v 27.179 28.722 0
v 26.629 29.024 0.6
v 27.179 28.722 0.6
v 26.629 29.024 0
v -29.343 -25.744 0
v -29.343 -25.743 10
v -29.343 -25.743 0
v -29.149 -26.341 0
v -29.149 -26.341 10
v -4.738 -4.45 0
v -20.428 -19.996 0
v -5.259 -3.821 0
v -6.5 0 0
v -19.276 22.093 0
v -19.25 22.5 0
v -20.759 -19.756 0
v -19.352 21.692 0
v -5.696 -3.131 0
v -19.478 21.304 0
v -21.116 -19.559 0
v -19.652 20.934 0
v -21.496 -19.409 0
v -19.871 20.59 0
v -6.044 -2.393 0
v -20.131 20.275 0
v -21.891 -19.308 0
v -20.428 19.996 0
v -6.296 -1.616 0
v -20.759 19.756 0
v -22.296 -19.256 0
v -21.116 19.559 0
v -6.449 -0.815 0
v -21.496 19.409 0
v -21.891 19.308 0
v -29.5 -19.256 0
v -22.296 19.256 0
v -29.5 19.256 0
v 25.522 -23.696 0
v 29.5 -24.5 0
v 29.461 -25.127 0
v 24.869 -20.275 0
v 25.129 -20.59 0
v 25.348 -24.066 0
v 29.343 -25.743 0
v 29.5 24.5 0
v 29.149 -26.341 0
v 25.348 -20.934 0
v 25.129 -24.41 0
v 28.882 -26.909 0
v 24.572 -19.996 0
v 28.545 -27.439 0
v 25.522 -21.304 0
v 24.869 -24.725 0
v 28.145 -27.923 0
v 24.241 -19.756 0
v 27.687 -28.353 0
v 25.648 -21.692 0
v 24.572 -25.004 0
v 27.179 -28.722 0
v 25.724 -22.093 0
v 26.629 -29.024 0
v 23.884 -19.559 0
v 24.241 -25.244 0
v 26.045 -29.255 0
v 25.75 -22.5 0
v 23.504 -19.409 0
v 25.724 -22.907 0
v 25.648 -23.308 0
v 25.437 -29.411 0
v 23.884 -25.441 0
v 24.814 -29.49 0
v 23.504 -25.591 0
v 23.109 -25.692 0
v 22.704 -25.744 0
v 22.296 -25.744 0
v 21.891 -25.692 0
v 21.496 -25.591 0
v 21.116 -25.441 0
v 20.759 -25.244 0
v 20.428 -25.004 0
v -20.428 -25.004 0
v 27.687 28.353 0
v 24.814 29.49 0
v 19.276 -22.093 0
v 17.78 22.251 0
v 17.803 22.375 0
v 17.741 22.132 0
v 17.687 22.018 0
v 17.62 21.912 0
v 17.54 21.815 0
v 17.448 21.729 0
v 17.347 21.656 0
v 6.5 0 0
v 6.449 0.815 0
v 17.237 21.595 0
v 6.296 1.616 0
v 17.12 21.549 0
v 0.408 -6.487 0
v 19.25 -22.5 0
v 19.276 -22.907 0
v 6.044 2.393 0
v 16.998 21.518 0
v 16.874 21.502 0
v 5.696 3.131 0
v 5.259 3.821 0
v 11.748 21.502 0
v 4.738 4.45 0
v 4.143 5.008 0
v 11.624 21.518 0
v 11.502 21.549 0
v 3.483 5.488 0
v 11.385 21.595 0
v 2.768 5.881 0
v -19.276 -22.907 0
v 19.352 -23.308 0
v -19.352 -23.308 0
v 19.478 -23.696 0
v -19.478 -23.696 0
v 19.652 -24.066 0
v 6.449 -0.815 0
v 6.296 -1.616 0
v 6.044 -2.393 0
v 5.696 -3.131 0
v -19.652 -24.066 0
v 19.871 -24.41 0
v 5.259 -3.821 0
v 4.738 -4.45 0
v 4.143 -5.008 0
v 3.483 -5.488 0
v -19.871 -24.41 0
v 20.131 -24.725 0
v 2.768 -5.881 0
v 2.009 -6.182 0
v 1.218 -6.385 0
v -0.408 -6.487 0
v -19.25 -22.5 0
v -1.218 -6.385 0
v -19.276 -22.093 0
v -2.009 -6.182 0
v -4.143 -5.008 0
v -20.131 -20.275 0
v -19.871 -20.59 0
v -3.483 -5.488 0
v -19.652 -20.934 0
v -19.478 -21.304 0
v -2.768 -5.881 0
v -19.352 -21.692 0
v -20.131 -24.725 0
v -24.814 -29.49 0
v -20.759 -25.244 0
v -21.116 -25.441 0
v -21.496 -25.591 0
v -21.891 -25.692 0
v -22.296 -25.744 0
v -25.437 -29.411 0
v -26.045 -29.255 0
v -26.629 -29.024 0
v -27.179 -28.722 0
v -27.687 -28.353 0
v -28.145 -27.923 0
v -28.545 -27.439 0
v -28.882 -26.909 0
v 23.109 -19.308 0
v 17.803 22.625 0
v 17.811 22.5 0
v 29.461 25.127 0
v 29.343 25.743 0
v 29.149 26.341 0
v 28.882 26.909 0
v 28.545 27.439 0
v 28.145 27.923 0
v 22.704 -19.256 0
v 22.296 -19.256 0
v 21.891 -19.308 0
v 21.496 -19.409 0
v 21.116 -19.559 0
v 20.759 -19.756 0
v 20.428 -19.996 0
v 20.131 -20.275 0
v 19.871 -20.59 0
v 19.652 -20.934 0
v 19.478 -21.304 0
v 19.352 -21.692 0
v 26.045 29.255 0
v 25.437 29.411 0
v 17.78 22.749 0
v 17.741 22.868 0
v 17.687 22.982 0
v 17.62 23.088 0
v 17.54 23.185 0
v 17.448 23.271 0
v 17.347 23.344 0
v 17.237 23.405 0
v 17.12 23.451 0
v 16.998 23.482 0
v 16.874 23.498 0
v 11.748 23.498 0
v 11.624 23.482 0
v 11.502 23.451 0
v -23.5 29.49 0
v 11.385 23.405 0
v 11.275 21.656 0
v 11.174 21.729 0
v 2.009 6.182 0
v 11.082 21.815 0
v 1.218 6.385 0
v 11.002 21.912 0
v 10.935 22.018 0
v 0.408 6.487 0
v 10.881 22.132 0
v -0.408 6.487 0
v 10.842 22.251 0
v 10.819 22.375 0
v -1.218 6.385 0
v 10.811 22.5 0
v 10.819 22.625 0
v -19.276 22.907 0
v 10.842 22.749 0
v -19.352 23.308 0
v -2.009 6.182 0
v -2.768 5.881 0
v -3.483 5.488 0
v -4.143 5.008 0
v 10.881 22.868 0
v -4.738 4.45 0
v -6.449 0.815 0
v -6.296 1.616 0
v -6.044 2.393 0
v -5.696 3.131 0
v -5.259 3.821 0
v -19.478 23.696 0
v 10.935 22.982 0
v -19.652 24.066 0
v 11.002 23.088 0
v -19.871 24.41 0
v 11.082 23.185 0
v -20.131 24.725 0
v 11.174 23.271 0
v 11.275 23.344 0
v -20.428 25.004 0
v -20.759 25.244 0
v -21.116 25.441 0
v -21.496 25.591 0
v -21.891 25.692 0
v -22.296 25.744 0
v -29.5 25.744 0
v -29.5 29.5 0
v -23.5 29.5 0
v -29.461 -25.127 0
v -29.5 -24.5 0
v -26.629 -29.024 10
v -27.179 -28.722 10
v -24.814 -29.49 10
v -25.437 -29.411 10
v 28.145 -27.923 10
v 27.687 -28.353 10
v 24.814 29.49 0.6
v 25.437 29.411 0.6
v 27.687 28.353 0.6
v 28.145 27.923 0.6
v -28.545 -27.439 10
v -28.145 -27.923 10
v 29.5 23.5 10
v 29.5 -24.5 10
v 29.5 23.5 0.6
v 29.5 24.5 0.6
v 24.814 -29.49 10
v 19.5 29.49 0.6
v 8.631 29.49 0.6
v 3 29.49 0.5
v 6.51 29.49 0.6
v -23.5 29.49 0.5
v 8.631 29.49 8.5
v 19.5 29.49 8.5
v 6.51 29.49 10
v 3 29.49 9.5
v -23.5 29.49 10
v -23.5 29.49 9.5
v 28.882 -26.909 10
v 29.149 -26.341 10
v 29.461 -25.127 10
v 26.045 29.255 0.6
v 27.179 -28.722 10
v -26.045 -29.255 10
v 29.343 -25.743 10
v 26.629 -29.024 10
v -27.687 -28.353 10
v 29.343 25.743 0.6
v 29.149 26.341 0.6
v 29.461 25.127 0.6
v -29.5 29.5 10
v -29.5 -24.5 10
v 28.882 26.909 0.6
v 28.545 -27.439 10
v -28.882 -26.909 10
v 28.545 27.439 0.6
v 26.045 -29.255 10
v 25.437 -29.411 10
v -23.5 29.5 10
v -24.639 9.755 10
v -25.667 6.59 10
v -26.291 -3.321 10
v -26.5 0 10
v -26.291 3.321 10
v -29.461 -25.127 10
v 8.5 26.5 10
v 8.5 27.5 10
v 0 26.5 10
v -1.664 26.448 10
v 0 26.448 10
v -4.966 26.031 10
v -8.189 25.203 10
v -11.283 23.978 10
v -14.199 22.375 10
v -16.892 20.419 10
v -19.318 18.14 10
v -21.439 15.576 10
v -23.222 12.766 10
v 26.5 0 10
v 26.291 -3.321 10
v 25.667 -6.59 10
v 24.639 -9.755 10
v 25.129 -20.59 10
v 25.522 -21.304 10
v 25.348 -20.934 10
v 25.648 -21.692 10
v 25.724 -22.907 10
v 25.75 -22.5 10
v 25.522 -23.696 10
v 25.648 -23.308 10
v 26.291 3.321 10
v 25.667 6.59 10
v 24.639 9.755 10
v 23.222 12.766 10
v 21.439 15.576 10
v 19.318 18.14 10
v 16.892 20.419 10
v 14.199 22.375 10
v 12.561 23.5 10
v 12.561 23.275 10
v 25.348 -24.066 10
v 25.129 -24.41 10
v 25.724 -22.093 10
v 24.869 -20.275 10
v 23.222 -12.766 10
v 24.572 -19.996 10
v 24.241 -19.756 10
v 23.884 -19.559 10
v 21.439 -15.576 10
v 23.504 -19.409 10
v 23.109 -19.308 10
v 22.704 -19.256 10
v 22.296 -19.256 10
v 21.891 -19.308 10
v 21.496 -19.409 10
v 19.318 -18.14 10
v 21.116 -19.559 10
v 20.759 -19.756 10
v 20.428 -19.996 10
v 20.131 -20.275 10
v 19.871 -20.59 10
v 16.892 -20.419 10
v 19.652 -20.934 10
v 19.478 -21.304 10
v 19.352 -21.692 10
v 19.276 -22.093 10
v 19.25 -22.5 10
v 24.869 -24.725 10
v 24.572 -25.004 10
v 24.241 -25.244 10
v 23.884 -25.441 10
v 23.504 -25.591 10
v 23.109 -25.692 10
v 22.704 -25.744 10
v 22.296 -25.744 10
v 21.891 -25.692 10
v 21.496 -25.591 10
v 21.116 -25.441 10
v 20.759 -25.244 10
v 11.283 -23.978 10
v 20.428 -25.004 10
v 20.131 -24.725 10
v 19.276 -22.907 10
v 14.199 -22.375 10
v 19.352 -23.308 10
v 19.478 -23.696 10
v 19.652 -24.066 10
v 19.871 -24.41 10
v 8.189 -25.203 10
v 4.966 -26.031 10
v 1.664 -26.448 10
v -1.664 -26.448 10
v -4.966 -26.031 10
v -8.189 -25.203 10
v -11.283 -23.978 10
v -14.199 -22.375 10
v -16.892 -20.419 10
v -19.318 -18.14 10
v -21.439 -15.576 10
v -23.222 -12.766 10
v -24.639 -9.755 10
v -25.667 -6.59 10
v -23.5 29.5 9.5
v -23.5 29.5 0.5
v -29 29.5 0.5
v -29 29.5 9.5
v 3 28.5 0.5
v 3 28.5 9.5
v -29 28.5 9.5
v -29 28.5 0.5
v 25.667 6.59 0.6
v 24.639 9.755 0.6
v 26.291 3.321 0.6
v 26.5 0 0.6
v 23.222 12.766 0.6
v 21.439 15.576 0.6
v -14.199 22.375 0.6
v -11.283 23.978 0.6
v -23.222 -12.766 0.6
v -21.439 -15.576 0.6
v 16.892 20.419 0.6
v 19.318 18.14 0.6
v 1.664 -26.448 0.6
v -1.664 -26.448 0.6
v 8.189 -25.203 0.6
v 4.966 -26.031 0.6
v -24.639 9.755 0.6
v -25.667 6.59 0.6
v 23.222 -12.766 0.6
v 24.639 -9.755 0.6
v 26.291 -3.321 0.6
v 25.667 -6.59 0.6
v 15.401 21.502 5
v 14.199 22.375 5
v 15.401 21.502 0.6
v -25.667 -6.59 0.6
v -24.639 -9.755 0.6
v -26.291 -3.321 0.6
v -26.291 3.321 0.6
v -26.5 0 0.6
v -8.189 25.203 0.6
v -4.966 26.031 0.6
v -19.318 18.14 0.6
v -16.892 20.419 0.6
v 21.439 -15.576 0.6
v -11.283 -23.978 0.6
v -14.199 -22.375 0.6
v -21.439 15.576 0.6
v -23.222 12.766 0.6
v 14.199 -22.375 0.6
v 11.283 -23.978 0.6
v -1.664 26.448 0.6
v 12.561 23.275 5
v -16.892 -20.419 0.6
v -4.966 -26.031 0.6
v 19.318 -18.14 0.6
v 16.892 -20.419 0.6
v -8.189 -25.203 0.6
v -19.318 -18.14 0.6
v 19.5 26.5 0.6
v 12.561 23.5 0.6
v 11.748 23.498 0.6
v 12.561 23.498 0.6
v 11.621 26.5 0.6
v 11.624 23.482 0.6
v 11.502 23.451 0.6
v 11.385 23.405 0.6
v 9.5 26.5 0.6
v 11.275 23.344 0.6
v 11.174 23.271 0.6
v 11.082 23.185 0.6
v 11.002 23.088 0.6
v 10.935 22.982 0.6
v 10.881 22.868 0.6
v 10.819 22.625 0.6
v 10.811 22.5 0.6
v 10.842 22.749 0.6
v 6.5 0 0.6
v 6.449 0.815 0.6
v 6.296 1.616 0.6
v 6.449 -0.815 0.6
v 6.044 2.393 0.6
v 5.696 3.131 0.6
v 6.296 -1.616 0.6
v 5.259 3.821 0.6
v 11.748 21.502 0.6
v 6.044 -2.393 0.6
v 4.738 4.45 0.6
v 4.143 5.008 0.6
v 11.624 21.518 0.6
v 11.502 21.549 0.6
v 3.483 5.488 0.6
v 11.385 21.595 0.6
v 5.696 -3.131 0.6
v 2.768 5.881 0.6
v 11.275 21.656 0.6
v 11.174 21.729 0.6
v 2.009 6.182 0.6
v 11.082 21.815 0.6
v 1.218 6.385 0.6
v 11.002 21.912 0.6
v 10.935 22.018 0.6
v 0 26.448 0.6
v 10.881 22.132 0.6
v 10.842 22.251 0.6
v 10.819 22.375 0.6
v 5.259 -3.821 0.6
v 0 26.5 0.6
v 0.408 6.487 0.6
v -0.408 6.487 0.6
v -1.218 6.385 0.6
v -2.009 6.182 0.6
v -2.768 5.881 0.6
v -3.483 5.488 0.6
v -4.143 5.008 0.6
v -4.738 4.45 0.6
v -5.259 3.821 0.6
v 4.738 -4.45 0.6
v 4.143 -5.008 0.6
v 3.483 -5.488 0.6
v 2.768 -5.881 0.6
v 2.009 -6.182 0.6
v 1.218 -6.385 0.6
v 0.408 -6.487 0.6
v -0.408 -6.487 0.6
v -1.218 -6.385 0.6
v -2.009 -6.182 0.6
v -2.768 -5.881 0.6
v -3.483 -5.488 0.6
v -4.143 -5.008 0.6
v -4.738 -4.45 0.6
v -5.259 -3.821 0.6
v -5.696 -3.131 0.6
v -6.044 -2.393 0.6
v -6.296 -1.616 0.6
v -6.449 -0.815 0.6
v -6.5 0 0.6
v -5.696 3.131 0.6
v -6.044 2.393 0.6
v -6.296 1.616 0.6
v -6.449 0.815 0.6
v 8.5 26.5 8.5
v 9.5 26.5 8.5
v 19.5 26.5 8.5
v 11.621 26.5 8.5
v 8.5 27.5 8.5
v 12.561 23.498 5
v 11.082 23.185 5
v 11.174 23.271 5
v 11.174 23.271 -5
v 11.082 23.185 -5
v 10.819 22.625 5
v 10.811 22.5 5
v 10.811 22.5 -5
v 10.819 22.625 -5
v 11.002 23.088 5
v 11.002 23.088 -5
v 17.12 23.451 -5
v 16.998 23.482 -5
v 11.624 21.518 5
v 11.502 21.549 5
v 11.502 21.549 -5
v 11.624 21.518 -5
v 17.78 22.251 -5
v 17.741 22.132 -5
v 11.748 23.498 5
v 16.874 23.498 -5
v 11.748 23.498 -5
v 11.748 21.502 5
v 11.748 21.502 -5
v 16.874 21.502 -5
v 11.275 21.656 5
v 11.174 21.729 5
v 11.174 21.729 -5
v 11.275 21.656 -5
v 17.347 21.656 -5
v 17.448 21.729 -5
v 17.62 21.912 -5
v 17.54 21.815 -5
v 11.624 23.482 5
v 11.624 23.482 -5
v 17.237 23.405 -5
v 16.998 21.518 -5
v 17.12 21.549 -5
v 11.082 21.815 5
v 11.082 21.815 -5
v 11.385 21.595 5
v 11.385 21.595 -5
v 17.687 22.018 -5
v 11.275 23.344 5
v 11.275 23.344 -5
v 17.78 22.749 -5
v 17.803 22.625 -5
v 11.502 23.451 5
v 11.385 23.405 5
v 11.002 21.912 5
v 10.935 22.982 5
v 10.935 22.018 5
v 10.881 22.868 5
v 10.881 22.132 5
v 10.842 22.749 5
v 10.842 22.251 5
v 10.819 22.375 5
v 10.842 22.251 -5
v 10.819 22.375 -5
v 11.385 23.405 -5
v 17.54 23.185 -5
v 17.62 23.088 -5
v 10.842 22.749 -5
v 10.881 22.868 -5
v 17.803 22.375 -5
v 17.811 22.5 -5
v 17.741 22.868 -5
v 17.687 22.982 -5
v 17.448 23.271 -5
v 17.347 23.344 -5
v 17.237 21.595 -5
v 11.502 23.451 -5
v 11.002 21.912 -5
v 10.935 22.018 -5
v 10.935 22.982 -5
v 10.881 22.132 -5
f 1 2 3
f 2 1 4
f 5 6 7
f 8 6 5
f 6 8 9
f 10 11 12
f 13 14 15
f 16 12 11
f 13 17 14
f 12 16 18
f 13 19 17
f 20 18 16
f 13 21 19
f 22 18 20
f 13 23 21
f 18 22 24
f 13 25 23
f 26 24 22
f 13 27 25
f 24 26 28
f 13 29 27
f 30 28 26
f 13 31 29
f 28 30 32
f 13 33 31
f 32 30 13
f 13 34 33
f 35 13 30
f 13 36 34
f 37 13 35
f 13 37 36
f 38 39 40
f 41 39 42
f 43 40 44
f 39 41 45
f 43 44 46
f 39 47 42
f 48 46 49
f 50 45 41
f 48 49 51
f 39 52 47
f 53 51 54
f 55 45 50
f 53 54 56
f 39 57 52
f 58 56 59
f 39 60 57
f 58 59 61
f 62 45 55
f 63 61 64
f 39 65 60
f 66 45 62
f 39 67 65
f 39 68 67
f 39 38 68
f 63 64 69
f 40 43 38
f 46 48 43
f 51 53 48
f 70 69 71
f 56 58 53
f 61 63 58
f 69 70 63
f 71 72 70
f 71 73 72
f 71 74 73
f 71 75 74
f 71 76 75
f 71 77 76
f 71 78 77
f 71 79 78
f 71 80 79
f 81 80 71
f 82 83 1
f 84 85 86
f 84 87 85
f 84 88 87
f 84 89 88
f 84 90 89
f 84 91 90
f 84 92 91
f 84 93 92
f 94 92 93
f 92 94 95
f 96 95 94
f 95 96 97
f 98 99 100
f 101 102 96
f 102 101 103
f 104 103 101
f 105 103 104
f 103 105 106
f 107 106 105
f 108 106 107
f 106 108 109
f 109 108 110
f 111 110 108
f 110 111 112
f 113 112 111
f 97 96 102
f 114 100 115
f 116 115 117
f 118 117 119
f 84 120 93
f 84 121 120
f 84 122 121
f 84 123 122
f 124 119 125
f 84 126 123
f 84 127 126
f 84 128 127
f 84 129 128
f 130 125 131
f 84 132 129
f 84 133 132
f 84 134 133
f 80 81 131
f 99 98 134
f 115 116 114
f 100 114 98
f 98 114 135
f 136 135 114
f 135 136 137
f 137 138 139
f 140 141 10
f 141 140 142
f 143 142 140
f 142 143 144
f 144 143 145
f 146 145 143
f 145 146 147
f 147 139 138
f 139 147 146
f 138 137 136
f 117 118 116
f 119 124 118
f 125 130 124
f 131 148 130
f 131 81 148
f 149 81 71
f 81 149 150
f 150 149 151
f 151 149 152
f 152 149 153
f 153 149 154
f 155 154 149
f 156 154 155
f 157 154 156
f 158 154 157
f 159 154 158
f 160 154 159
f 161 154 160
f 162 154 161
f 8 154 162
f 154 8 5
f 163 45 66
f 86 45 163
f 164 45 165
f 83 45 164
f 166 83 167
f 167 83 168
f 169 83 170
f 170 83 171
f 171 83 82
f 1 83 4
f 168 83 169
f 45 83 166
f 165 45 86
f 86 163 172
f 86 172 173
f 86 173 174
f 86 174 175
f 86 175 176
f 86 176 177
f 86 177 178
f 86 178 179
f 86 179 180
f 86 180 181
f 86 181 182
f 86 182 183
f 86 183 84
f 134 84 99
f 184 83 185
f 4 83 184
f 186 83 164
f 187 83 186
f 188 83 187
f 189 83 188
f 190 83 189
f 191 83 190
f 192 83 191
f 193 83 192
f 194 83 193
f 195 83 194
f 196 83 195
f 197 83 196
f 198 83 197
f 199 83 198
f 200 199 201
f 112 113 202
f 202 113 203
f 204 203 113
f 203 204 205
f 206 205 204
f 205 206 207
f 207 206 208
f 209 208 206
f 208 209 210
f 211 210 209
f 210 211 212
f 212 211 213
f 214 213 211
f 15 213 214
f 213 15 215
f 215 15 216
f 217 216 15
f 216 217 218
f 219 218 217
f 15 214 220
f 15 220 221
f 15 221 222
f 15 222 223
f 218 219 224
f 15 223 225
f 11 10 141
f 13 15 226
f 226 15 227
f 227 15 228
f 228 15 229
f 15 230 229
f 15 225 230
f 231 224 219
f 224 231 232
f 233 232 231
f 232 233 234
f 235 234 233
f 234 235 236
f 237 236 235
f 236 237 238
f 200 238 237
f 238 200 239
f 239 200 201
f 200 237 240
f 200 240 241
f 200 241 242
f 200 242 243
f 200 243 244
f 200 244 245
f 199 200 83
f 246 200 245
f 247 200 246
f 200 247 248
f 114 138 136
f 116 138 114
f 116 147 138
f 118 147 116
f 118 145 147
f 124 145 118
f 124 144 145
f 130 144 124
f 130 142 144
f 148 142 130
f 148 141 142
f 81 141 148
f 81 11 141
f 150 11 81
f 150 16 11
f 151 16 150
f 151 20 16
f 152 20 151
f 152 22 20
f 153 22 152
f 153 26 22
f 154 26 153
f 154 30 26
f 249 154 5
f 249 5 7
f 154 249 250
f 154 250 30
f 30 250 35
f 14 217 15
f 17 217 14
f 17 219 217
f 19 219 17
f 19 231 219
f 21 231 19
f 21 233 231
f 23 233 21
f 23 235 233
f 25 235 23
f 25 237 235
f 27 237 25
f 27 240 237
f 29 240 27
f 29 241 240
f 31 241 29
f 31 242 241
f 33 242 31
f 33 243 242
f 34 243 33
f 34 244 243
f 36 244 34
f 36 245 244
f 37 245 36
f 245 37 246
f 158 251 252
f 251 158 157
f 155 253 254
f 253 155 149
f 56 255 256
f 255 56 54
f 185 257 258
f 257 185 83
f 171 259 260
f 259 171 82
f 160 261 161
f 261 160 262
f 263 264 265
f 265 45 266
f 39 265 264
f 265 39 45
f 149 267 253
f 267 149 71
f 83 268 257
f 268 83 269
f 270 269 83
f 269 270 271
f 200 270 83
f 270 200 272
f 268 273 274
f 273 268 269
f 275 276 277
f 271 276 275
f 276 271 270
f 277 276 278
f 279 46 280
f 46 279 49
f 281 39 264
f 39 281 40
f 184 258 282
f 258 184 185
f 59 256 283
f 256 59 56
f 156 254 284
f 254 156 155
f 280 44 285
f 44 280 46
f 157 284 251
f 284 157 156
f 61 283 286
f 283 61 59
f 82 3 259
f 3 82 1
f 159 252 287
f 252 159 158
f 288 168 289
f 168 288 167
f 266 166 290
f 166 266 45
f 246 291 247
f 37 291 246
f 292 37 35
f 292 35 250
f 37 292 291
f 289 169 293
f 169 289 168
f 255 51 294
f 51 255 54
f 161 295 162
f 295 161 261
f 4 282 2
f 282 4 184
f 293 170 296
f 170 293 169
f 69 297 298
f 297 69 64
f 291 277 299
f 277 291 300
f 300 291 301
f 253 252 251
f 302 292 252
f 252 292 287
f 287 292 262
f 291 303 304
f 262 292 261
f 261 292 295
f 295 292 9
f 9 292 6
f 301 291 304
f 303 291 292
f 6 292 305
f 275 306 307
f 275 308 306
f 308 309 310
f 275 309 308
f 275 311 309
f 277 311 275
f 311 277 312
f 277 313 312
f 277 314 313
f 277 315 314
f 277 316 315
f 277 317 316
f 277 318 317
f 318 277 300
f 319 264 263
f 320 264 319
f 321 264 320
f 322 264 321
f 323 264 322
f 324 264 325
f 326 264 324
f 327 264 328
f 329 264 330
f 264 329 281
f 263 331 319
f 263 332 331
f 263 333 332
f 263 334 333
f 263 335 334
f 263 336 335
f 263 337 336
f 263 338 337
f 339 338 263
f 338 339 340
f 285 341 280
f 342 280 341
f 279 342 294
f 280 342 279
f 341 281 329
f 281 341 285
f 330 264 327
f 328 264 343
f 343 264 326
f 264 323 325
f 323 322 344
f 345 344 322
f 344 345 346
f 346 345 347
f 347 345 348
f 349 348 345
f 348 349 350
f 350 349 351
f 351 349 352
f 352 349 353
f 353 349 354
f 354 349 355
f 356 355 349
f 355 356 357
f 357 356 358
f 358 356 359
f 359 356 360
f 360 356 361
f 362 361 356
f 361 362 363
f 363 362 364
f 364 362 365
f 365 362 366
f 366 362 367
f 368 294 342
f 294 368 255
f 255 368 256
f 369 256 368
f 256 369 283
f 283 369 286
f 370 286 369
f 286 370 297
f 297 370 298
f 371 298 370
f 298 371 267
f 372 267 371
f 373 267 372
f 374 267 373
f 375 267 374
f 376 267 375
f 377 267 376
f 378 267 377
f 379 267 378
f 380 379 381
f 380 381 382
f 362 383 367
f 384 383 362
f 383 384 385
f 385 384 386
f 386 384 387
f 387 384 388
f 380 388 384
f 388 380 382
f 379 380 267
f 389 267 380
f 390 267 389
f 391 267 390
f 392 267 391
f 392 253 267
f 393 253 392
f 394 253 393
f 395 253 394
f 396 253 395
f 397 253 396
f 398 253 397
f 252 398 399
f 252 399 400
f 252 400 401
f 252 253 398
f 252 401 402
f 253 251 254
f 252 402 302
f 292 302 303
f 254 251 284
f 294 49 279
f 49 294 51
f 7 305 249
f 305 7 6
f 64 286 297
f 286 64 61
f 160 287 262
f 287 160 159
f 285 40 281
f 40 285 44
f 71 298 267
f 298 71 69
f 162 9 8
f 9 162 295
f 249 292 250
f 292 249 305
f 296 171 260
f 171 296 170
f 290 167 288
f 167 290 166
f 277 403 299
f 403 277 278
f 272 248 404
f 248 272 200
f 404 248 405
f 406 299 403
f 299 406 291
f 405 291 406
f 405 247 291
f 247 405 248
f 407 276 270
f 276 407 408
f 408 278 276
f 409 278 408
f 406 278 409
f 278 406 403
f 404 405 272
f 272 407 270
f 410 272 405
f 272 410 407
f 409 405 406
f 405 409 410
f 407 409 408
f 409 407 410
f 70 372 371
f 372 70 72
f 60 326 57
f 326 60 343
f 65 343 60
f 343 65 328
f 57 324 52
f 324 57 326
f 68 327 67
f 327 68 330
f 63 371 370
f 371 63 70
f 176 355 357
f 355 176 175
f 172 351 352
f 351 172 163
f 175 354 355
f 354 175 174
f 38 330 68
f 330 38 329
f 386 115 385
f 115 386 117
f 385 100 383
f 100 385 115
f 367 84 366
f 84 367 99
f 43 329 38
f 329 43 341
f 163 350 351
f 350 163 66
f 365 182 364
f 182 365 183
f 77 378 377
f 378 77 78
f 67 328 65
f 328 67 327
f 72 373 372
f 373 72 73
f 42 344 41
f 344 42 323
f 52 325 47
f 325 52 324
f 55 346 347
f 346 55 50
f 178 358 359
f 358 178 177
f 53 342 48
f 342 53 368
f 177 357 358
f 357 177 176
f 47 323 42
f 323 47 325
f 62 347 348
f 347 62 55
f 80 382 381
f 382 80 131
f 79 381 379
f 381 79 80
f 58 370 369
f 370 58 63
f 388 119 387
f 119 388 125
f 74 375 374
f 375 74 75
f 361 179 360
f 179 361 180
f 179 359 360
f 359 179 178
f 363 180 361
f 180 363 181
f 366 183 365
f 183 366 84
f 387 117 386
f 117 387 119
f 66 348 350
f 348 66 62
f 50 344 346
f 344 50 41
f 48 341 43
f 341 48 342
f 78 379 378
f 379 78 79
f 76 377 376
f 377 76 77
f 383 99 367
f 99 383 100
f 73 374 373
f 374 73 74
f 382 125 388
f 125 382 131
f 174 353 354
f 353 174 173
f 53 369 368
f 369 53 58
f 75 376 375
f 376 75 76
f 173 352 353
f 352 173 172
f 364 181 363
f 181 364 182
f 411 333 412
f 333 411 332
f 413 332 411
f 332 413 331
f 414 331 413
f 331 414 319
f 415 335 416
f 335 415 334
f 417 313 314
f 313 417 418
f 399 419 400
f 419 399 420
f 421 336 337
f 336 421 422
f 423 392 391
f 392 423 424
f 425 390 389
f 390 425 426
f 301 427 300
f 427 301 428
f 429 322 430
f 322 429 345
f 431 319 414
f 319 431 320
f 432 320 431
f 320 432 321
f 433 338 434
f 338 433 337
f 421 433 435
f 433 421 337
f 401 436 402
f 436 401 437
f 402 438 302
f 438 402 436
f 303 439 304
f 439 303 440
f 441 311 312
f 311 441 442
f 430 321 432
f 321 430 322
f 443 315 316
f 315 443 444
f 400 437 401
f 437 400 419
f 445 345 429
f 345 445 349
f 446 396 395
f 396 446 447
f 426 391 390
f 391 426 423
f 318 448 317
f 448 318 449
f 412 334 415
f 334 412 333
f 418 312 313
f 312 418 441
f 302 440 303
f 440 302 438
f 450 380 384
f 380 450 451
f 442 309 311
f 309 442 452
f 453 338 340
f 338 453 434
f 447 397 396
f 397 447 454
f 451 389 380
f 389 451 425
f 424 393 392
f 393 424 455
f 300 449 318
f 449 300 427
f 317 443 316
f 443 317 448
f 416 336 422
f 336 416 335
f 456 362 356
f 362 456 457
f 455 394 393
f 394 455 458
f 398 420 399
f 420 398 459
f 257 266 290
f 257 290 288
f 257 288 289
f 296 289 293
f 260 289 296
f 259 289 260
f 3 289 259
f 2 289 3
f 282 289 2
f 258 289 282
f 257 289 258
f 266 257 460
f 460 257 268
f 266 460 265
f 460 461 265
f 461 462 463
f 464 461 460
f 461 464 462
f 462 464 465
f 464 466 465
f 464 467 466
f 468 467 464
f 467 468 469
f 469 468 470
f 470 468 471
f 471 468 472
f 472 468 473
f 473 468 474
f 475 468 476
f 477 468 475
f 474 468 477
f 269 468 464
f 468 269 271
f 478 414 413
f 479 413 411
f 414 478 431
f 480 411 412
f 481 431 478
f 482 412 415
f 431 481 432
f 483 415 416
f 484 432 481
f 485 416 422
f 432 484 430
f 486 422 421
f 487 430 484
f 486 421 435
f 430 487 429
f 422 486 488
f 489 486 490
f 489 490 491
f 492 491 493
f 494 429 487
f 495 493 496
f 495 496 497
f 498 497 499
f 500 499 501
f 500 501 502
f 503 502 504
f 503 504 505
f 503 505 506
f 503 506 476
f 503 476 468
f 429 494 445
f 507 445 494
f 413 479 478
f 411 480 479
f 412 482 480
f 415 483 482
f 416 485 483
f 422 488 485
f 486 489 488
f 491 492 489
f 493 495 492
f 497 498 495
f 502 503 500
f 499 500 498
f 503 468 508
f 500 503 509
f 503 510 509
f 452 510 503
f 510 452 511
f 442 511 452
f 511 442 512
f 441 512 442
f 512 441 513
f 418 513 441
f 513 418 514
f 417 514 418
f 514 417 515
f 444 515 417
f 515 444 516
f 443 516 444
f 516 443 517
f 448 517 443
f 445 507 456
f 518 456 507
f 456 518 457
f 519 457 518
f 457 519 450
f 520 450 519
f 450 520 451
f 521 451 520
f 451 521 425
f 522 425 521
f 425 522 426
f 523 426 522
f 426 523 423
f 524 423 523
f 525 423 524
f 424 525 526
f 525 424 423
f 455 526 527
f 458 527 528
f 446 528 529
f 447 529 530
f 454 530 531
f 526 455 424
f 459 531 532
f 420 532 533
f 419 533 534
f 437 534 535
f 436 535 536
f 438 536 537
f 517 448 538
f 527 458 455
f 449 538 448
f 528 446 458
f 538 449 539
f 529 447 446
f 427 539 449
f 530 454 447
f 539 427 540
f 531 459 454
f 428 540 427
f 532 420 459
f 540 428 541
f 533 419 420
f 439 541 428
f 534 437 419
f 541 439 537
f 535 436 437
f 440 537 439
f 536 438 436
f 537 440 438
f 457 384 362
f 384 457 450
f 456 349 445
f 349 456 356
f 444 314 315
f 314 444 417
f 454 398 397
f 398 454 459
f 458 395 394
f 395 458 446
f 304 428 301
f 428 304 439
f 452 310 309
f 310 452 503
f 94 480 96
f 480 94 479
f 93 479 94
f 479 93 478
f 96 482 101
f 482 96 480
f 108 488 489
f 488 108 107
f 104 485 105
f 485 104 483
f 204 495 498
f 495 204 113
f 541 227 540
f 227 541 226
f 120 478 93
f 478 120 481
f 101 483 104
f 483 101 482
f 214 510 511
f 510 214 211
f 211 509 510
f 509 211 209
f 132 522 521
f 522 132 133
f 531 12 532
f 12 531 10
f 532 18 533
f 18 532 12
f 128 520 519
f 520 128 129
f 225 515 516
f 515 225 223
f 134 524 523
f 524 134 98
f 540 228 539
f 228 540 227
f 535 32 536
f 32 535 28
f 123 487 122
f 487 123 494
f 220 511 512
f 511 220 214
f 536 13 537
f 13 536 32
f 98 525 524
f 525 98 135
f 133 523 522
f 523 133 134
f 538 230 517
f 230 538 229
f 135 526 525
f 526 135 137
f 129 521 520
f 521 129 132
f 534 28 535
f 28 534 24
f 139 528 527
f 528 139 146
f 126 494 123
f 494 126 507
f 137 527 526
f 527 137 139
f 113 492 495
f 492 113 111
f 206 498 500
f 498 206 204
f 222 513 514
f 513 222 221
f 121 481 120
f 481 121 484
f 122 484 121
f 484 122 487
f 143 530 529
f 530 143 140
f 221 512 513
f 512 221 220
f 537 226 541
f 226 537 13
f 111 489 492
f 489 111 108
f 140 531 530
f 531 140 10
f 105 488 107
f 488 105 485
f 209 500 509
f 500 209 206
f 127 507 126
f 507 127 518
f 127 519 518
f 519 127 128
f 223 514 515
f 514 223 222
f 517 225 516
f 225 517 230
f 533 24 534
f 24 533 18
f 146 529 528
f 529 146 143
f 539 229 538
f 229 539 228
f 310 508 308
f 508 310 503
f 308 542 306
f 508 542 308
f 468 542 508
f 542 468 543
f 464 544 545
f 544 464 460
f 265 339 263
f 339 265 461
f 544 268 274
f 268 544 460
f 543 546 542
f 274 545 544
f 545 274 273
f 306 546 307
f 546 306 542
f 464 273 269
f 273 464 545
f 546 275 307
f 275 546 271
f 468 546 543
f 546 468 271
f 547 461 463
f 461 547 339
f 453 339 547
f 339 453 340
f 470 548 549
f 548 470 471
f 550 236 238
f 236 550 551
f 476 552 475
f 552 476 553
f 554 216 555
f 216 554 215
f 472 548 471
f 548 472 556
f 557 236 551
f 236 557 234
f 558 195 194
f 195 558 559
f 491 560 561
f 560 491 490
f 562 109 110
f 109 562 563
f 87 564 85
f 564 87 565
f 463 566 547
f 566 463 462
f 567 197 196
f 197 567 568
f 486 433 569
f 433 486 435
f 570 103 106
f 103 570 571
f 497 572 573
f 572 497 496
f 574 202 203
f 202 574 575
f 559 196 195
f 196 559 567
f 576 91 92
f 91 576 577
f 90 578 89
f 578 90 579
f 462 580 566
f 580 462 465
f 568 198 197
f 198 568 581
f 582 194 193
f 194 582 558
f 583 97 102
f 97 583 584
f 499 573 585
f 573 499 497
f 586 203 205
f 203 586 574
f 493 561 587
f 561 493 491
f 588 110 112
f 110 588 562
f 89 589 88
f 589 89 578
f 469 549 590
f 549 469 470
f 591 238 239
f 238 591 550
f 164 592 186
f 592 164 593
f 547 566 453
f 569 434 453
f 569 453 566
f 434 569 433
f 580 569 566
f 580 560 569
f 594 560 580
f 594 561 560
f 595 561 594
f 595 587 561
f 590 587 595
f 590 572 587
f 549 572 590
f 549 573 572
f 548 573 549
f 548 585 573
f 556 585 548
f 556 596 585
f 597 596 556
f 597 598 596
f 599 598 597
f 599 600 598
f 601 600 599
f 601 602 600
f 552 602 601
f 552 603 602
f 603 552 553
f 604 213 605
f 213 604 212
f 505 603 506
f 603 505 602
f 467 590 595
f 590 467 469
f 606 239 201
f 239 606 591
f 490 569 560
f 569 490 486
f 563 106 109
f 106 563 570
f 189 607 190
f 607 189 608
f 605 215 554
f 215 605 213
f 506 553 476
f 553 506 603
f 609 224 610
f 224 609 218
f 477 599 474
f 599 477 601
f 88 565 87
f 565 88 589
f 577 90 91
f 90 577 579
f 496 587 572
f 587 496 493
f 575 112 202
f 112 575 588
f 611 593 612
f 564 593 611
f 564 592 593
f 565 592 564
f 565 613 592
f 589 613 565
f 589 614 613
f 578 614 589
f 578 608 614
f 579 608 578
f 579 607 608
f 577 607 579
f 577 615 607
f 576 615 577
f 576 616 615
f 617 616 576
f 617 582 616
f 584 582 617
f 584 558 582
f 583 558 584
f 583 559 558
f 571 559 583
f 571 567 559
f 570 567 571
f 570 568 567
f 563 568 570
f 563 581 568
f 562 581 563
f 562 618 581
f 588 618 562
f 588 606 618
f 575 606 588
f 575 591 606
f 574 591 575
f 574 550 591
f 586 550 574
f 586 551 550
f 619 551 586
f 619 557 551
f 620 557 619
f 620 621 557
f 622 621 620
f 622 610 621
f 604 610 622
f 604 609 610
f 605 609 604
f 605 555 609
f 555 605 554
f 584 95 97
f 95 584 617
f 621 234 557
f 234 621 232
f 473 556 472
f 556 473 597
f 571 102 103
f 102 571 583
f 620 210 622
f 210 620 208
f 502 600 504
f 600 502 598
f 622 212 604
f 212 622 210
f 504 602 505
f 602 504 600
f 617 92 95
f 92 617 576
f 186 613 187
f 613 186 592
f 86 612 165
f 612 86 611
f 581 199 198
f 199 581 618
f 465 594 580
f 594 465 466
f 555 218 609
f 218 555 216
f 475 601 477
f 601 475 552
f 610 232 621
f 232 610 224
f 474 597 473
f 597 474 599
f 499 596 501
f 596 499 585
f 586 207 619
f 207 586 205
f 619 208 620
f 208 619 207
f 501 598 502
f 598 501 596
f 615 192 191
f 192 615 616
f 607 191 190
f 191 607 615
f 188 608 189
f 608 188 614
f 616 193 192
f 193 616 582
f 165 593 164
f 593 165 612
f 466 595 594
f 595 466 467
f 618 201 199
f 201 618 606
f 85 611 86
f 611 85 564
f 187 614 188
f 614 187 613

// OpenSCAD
$fn = 50;


union() {
	difference() {
		union() {
			hull() {
				translate(v = [-24.5000000000, 24.5000000000, 0]) {
					cylinder(h = 10, r = 5);
				}
				translate(v = [24.5000000000, 24.5000000000, 0]) {
					cylinder(h = 10, r = 5);
				}
				translate(v = [-24.5000000000, -24.5000000000, 0]) {
					cylinder(h = 10, r = 5);
				}
				translate(v = [24.5000000000, -24.5000000000, 0]) {
					cylinder(h = 10, r = 5);
				}
			}
			translate(v = [-29.5000000000, 23.5000000000, 0]) {
				cube(size = [6, 6, 10]);
			}
		}
		union() {
			translate(v = [-30.0000000000, -22.5000000000, -250.0000000000]) {
				rotate(a = [0, 0, 0]) {
					difference() {
						union() {
							hull() {
								translate(v = [7.5000000000, 0, 0]) {
									cylinder(h = 250, r = 3.2500000000, r1 = 3.2500000000, r2 = 3.2500000000);
								}
								translate(v = [-7.5000000000, 0, 0]) {
									cylinder(h = 250, r = 3.2500000000, r1 = 3.2500000000, r2 = 3.2500000000);
								}
							}
						}
						union();
					}
				}
			}
			translate(v = [-30.0000000000, 22.5000000000, -250.0000000000]) {
				rotate(a = [0, 0, 0]) {
					difference() {
						union() {
							hull() {
								translate(v = [7.5000000000, 0, 0]) {
									cylinder(h = 250, r = 3.2500000000, r1 = 3.2500000000, r2 = 3.2500000000);
								}
								translate(v = [-7.5000000000, 0, 0]) {
									cylinder(h = 250, r = 3.2500000000, r1 = 3.2500000000, r2 = 3.2500000000);
								}
							}
						}
						union();
					}
				}
			}
			translate(v = [-29.0000000000, 28.5000000000, 0.5000000000]) {
				cube(size = [32, 1, 9.0000000000]);
			}
			translate(v = [22.5000000000, -22.5000000000, 0]) {
				cylinder(h = 100, r = 3.2500000000);
			}
			translate(v = [0, 0, 0.6000000000]) {
				cylinder(h = 12.4000000000, r = 26.5000000000);
			}
			translate(v = [0, 0, -5.0000000000]) {
				cylinder(h = 10, r = 6.5000000000);
			}
			translate(v = [0.0000000000, 23.5000000000, 0.6000000000]) {
				cube(size = [29.5000000000, 3, 12.4000000000]);
			}
			translate(v = [19.5000000000, 23.5000000000, 0.6000000000]) {
				cube(size = [10, 6, 12.4000000000]);
			}
			translate(v = [8.5000000000, 23.5000000000, 8.5000000000]) {
				cube(size = [21, 6, 1.5000000000]);
			}
			translate(v = [5.7500000000, 30.2500000000, 0.6000000000]) {
				rotate(a = [0, 0, -45]) {
					cube(size = [7.5000000000, 1.5000000000, 12.4000000000]);
				}
			}
			translate(v = [5.0610000000, 21.5000000000, 0.6000000000]) {
				cube(size = [7.5000000000, 2, 9.4000000000]);
			}
		}
	}
	union() {
		translate(v = [14.3110000000, 22.5000000000, -5.0000000000]) {
			rotate(a = [0, 0, 0]) {
				difference() {
					union() {
						#hull() {
							#translate(v = [2.5000000000, 0, 0]) {
								cylinder(h = 10, r = 1.0000000000, r1 = 1.0000000000, r2 = 1.0000000000);
							}
							#translate(v = [-2.5000000000, 0, 0]) {
								cylinder(h = 10, r = 1.0000000000, r1 = 1.0000000000, r2 = 1.0000000000);
							}
						}
					}
					union();
				}
			}
		}
	}
}
